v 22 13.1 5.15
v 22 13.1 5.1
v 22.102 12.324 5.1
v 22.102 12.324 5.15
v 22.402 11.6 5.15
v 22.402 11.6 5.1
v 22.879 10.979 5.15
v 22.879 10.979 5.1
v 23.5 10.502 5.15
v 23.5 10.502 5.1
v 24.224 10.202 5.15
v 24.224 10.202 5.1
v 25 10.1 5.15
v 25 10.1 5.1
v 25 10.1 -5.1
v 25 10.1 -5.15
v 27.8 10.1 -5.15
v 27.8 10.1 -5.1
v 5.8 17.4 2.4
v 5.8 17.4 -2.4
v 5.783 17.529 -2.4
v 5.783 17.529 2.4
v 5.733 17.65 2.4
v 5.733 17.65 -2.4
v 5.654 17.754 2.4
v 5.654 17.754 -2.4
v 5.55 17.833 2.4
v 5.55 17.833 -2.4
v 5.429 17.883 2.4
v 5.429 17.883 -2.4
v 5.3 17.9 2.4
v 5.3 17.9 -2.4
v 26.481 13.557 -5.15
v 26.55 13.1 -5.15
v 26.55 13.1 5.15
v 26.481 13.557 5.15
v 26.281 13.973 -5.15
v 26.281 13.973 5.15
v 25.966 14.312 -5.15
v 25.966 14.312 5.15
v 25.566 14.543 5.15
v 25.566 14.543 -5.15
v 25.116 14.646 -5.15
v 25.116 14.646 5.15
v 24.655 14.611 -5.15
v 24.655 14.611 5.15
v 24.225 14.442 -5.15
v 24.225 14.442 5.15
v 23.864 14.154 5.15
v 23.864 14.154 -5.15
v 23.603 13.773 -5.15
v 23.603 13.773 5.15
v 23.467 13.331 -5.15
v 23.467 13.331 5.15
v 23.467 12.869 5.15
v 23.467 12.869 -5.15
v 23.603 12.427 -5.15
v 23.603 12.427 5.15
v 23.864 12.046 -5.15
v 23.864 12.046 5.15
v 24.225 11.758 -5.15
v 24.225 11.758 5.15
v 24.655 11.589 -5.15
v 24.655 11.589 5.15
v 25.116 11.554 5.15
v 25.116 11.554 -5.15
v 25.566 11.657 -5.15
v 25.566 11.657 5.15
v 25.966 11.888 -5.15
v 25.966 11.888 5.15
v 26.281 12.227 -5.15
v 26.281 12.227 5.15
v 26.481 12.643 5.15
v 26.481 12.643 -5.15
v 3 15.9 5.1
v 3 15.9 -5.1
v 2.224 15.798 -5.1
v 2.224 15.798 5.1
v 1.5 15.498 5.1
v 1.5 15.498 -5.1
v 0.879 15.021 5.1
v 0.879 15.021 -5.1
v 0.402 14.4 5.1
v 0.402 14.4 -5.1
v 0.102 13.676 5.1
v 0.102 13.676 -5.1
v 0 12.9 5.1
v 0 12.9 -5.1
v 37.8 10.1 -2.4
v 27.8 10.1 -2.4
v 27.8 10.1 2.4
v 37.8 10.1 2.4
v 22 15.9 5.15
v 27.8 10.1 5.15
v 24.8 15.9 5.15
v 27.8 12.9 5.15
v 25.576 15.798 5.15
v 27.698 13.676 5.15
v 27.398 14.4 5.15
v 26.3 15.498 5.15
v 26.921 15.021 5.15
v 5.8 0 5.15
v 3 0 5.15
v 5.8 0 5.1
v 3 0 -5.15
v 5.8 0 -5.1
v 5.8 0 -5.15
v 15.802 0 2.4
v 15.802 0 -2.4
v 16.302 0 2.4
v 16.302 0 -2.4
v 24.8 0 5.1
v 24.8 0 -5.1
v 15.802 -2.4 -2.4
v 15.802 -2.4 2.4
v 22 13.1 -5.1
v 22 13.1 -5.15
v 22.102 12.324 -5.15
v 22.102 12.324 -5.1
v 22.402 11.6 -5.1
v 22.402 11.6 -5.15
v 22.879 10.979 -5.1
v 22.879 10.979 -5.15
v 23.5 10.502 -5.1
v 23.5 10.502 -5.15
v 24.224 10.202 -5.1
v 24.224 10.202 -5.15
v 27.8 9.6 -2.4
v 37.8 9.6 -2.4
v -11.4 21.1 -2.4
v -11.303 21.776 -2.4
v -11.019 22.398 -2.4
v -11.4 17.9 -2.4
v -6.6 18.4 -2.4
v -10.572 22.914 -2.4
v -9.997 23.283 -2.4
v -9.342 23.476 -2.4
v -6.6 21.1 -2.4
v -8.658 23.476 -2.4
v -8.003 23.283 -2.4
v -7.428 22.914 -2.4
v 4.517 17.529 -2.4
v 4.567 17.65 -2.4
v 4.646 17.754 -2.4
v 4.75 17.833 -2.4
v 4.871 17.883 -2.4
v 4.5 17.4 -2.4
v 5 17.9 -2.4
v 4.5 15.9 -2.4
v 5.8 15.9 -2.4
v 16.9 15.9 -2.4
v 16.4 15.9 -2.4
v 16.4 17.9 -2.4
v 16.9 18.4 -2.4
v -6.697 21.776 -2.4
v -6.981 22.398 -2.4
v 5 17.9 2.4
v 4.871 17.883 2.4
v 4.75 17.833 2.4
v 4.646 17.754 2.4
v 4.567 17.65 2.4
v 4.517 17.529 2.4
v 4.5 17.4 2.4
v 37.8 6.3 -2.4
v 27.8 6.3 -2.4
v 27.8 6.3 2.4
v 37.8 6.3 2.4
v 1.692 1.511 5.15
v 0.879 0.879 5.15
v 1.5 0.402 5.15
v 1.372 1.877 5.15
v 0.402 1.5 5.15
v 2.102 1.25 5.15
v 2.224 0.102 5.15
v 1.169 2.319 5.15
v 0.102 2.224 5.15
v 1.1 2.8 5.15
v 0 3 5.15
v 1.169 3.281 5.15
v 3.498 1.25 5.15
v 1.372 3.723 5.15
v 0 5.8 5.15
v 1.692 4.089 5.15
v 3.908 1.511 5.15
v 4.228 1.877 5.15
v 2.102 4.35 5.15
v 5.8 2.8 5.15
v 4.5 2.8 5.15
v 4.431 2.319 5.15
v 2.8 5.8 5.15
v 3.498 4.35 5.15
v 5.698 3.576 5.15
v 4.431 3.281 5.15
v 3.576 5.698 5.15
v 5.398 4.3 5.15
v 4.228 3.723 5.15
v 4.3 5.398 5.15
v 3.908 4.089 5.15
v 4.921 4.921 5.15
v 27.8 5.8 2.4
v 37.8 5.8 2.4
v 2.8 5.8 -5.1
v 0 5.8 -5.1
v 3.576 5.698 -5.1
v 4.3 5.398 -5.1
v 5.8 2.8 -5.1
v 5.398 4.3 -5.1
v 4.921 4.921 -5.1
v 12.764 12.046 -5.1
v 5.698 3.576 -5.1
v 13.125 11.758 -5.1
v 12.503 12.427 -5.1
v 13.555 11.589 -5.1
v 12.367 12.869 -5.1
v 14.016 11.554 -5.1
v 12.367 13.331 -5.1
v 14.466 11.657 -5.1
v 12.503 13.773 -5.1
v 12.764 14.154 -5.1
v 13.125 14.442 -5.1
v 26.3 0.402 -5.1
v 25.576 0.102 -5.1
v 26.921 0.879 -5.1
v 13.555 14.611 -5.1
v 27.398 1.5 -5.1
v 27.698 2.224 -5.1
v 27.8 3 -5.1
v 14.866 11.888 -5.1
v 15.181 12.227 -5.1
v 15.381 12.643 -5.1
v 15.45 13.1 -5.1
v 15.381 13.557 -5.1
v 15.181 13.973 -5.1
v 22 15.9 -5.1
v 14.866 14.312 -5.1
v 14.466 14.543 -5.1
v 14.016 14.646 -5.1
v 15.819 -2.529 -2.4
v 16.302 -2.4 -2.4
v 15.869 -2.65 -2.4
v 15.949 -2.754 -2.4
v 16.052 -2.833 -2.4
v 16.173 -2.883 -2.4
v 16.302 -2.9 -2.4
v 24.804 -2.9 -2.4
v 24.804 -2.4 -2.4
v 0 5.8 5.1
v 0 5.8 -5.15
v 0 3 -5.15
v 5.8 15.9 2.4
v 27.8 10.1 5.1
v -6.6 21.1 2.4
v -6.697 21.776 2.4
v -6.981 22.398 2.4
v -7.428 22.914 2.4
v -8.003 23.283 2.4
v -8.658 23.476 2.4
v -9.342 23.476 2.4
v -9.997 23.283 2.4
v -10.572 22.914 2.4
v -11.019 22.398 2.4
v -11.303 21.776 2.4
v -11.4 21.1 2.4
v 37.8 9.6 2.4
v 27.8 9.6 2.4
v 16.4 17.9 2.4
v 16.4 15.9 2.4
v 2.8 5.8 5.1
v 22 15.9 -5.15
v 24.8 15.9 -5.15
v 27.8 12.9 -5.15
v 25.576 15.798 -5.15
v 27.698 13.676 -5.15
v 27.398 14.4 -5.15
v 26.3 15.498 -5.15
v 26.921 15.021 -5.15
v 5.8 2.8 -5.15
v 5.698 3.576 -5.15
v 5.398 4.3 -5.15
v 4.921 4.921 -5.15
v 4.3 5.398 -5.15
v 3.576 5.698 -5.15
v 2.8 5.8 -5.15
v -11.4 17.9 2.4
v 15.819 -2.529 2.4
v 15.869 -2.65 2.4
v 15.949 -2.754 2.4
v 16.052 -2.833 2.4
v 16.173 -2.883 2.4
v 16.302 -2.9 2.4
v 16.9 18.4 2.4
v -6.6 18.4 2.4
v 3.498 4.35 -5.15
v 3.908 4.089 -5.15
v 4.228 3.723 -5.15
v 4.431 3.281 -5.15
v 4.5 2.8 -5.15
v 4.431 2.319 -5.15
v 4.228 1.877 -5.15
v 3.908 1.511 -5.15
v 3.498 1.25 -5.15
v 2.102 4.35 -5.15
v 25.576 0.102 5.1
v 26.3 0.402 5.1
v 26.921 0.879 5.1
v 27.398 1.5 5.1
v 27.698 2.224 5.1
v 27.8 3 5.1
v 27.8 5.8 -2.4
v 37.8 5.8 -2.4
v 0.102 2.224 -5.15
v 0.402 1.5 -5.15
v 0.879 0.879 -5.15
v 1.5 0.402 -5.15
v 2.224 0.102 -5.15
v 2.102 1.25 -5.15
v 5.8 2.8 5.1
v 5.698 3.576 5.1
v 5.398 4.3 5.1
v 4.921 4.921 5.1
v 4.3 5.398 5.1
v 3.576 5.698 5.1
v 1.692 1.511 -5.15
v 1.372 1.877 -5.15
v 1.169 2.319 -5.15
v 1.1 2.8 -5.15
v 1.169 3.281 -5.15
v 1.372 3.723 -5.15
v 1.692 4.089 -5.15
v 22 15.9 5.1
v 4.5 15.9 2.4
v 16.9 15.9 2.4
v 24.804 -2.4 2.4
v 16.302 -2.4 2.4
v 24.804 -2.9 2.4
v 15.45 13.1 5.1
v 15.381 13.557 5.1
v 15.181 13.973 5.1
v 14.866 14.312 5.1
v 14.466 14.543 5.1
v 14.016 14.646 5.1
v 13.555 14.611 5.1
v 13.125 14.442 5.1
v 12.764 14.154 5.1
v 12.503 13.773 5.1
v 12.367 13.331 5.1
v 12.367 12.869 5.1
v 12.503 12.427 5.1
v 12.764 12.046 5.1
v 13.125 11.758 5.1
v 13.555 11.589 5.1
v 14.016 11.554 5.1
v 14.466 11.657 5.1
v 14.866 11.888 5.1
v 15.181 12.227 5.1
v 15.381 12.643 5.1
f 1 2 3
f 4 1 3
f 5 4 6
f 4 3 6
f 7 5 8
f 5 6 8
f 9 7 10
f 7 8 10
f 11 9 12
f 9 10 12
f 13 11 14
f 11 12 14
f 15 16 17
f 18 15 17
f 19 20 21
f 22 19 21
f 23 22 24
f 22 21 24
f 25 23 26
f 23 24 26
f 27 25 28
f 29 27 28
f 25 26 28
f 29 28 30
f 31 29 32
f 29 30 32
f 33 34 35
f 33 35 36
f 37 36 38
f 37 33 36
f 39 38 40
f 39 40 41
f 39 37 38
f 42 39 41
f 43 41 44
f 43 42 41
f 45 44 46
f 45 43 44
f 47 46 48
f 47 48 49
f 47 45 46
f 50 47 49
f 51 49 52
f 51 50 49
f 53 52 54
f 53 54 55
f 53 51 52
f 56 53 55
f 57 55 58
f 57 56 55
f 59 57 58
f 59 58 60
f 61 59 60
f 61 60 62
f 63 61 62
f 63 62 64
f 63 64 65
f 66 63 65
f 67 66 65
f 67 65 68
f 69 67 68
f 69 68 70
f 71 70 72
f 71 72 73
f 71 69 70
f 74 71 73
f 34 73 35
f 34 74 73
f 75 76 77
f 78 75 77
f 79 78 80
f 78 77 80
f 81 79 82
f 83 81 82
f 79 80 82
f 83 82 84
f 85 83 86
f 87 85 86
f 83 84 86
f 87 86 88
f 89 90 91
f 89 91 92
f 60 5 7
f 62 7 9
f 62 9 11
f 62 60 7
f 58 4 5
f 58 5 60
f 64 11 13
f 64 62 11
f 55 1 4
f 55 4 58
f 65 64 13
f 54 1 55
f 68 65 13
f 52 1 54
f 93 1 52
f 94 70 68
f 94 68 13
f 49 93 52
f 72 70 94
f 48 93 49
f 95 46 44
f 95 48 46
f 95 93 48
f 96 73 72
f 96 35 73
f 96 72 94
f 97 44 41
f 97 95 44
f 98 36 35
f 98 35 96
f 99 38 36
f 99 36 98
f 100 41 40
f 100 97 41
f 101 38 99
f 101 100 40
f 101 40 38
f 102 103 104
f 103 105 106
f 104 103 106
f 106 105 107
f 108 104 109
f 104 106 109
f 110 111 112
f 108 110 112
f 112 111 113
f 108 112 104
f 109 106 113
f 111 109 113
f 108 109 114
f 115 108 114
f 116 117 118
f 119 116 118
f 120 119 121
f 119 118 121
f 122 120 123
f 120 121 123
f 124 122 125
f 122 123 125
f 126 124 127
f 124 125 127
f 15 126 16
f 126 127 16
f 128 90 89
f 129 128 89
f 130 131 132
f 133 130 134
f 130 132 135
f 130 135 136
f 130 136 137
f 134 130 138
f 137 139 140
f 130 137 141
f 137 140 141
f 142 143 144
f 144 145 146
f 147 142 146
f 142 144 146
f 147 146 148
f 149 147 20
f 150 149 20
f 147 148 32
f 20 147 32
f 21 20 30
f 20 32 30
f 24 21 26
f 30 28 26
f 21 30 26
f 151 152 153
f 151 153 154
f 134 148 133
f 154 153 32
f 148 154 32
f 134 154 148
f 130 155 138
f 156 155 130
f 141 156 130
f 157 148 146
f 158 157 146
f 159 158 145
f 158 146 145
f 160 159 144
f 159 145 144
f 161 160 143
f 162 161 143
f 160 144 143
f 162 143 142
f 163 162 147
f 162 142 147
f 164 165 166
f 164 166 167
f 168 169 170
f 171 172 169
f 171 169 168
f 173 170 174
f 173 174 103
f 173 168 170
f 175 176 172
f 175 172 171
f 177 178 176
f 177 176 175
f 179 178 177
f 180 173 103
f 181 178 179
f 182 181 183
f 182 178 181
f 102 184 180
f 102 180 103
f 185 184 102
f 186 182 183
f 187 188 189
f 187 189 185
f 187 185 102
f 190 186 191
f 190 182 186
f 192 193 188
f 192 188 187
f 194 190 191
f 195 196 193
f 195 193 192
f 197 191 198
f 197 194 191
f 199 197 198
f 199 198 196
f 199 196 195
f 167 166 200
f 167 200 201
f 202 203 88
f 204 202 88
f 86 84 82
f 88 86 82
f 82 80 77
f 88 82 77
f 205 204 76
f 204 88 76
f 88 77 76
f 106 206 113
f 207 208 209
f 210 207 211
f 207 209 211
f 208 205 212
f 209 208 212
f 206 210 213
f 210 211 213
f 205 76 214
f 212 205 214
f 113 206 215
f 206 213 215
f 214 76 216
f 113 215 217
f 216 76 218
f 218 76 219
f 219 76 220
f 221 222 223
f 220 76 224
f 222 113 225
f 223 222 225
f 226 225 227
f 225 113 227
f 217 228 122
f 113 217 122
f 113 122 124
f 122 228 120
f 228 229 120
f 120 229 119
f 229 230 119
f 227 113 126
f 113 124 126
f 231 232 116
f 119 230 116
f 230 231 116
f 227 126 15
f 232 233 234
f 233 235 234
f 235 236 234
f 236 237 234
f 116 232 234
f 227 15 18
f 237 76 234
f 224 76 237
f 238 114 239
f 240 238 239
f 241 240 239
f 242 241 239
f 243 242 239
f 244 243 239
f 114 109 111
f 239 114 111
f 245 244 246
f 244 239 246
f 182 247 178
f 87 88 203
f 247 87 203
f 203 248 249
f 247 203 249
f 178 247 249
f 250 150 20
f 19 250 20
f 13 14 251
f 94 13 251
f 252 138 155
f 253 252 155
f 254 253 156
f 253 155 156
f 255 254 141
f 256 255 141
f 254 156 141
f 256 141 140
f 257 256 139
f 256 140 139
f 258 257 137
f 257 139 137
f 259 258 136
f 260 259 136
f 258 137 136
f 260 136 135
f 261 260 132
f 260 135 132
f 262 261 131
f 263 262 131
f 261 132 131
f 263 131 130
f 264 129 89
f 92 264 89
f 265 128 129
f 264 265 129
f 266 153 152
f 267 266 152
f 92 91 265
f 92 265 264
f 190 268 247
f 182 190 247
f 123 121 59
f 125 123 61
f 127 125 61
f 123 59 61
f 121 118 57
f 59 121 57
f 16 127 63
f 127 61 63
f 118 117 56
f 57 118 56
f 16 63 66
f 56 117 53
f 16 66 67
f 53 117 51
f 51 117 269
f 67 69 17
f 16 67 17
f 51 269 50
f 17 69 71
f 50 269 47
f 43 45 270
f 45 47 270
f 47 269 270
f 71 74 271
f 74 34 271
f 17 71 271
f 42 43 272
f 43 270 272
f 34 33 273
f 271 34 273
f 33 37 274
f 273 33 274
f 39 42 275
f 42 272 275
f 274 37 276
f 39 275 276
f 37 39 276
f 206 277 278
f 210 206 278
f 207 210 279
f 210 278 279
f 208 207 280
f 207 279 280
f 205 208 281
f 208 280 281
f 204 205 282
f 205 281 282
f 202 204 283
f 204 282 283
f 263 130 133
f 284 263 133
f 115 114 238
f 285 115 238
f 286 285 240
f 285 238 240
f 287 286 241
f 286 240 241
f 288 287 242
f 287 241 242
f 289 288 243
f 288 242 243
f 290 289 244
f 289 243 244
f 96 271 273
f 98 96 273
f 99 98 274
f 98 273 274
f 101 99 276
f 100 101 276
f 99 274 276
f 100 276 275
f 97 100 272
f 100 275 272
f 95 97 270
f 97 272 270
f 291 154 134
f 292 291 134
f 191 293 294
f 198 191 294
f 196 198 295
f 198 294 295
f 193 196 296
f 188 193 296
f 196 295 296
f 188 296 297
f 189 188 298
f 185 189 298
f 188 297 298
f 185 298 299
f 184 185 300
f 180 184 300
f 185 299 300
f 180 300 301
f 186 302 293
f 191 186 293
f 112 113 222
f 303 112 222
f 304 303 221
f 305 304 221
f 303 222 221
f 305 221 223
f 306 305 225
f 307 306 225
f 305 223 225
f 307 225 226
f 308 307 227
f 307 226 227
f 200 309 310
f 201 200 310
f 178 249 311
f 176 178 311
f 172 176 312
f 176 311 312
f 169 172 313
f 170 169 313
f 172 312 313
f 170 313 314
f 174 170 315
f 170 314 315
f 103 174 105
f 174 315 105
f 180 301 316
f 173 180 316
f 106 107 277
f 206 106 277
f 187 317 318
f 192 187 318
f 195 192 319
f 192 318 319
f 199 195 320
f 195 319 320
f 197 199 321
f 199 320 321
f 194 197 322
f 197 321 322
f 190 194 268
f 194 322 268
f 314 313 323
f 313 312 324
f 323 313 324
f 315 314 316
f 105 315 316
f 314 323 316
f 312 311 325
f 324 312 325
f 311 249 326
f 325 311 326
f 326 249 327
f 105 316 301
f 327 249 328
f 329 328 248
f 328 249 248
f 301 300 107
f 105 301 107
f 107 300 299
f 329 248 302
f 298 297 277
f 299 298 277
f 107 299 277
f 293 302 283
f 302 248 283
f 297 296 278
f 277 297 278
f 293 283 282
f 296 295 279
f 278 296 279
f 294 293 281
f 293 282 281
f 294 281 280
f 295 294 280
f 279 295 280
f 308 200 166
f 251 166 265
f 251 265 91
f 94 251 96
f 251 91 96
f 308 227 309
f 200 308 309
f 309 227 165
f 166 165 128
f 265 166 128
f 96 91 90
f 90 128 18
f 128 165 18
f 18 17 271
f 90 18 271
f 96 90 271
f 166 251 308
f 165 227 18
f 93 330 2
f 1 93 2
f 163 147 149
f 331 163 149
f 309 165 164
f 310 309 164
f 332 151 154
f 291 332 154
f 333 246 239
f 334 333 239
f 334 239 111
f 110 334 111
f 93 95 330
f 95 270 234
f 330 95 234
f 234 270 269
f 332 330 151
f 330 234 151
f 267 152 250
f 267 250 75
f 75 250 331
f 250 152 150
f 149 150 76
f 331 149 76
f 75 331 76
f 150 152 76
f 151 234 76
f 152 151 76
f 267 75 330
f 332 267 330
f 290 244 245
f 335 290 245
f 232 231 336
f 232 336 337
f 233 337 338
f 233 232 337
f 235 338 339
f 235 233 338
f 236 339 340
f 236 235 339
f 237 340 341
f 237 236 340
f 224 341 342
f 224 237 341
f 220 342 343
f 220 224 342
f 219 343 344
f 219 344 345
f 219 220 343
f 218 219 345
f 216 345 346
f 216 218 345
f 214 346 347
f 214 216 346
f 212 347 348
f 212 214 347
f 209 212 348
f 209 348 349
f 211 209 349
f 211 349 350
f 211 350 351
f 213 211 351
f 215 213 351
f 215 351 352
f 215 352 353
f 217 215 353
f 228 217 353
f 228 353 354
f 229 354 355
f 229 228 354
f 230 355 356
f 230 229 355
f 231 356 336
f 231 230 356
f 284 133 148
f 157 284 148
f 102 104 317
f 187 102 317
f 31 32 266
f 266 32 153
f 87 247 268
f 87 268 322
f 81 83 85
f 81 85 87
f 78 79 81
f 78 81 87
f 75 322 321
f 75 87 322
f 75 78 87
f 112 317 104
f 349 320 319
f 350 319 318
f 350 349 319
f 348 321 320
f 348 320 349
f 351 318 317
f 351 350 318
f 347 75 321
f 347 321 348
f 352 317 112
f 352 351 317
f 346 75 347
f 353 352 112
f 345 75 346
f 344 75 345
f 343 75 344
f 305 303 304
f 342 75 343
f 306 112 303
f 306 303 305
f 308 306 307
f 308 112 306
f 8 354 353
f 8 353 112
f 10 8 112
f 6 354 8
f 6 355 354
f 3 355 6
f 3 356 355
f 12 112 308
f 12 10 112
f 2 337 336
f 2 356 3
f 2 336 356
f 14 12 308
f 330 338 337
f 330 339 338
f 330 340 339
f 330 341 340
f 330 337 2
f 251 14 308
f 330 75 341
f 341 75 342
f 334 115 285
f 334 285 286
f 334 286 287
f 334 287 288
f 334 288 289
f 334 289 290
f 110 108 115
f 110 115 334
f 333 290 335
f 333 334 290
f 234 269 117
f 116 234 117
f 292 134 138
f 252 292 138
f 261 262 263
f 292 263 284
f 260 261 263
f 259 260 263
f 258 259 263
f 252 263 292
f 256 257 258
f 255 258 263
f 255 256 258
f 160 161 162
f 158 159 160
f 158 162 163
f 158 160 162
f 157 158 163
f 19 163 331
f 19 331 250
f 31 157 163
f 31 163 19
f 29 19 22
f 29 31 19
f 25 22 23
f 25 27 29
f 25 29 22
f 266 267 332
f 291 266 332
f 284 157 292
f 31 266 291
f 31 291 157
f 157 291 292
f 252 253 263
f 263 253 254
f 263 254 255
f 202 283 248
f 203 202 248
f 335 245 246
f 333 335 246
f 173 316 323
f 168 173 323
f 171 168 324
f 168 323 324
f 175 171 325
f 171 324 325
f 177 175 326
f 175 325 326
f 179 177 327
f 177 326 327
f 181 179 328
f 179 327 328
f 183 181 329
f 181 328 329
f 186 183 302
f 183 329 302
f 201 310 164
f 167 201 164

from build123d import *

# Parameters (mm, degrees)
BOSS_EXTRUDE1_DEPTH      = 5.1
BOSS_EXTRUDE1_DEPTH_BACK = 5.1
SKETCH1_R                = 1.55
BOSS_EXTRUDE2_DEPTH      = 5.15
BOSS_EXTRUDE2_DEPTH_BACK = 5.15
SKETCH1_3_R              = 1.55
BOSS_EXTRUDE3_DEPTH      = 2.4
BOSS_EXTRUDE3_DEPTH_BACK = 2.4
SKETCH1_4_W              = 10
SKETCH1_4_H              = 0.5


with BuildPart() as part:
    # Sketch1 → Boss-Extrude1 (new, two sides: drawn at the far end of the back side and taken through both)
    with BuildSketch(Plane.XY.offset(-BOSS_EXTRUDE1_DEPTH_BACK)):
        with BuildLine():
            Line((5.8, 2.8), (5.8, 0))
            Line((5.8, 0), (15.802181202, 0))
            Line((15.802181202, 0), (16.302181202, 0))
            Line((16.302181202, 0), (24.8, 0))
            ThreePointArc((24.8, 0), (26.921320344, 0.878679656), (27.8, 3))
            Line((27.8, 3), (27.8, 5.8))
            Line((27.8, 5.8), (27.8, 6.3))
            Line((27.8, 6.3), (27.8, 9.6))
            Line((27.8, 9.6), (27.8, 10.1))
            Line((27.8, 10.1), (25, 10.1))
            ThreePointArc((25, 10.1), (22.878679656, 10.978679656), (22, 13.1))
            Line((22, 13.1), (22, 15.9))
            Line((22, 15.9), (16.9, 15.9))
            Line((16.9, 15.9), (16.4, 15.9))
            Line((16.4, 15.9), (5.8, 15.9))
            Line((5.8, 15.9), (4.5, 15.9))
            Line((4.5, 15.9), (3, 15.9))
            ThreePointArc((3, 15.9), (0.878679656, 15.021320344), (0, 12.9))
            Line((0, 12.9), (0, 5.8))
            Line((0, 5.8), (2.8, 5.8))
            ThreePointArc((2.8, 5.8), (4.921320344, 4.921320344), (5.8, 2.8))
        make_face()
        with Locations((13.9, 13.1)):
            Circle(SKETCH1_R, mode=Mode.SUBTRACT)
    extrude(amount=BOSS_EXTRUDE1_DEPTH + BOSS_EXTRUDE1_DEPTH_BACK)

    # Sketch1<3> → Boss-Extrude2 (add, two sides: drawn at the far end of the back side and taken through both)
    # profile 1 of 2: a face of its own
    with BuildSketch(Plane.XY.offset(-BOSS_EXTRUDE2_DEPTH_BACK)):
        with BuildLine():
            ThreePointArc((0, 3), (0.878679656, 0.878679656), (3, 0))
            Line((3, 0), (5.8, 0))
            Line((5.8, 0), (5.8, 2.8))
            ThreePointArc((5.8, 2.8), (4.921320344, 4.921320344), (2.8, 5.8))
            Line((2.8, 5.8), (0, 5.8))
            Line((0, 5.8), (0, 3))
        make_face()
        with BuildLine():
            Line((3.498212002, 1.25), (2.101787998, 1.25))
            ThreePointArc((2.101787998, 1.25), (1.1, 2.8), (2.101787998, 4.35))
            Line((2.101787998, 4.35), (3.498212002, 4.35))
            ThreePointArc((3.498212002, 4.35), (4.5, 2.8), (3.498212002, 1.25))
        make_face(mode=Mode.SUBTRACT)
    # profile 2 of 2: a face of its own
    with BuildSketch(Plane.XY.offset(-BOSS_EXTRUDE2_DEPTH_BACK)):
        with BuildLine():
            Line((25, 10.1), (27.8, 10.1))
            Line((27.8, 10.1), (27.8, 12.9))
            ThreePointArc((27.8, 12.9), (26.921320344, 15.021320344), (24.8, 15.9))
            Line((24.8, 15.9), (22, 15.9))
            Line((22, 15.9), (22, 13.1))
            ThreePointArc((22, 13.1), (22.878679656, 10.978679656), (25, 10.1))
        make_face()
        with Locations((25, 13.1)):
            Circle(SKETCH1_3_R, mode=Mode.SUBTRACT)
    extrude(amount=BOSS_EXTRUDE2_DEPTH + BOSS_EXTRUDE2_DEPTH_BACK)

    # Sketch1<4> → Boss-Extrude3 (add, two sides: drawn at the far end of the back side and taken through both)
    with BuildSketch(Plane.XY.offset(-BOSS_EXTRUDE3_DEPTH_BACK)):
        with BuildLine():
            Line((16.302181202, 0), (15.802181202, 0))
            Line((15.802181202, 0), (15.802181202, -2.4))
            ThreePointArc((15.802181202, -2.4), (15.948627812, -2.753553391), (16.302181202, -2.9))
            Line((16.302181202, -2.9), (24.80383619, -2.9))
            Line((24.80383619, -2.9), (24.80383619, -2.4))
            Line((24.80383619, -2.4), (16.302181202, -2.4))
            Line((16.302181202, -2.4), (16.302181202, 0))
        make_face()
        with BuildLine():
            Line((4.5, 17.4), (4.5, 15.9))
            Line((4.5, 15.9), (5.8, 15.9))
            Line((5.8, 15.9), (5.8, 17.4))
            ThreePointArc((5.8, 17.4), (5.653553391, 17.753553391), (5.3, 17.9))
            Line((5.3, 17.9), (16.4, 17.9))
            Line((16.4, 17.9), (16.4, 15.9))
            Line((16.4, 15.9), (16.9, 15.9))
            Line((16.9, 15.9), (16.9, 18.4))
            Line((16.9, 18.4), (-6.6, 18.4))
            Line((-6.6, 18.4), (-6.6, 21.1))
            ThreePointArc((-6.6, 21.1), (-9, 23.5), (-11.4, 21.1))
            Line((-11.4, 21.1), (-11.4, 17.9))
            Line((-11.4, 17.9), (5, 17.9))
            ThreePointArc((5, 17.9), (4.646446609, 17.753553391), (4.5, 17.4))
        make_face()
        with Locations((32.8, 6.05)):
            Rectangle(SKETCH1_4_W, SKETCH1_4_H)
        with Locations((32.8, 9.85)):
            Rectangle(SKETCH1_4_W, SKETCH1_4_H)
    extrude(amount=BOSS_EXTRUDE3_DEPTH + BOSS_EXTRUDE3_DEPTH_BACK)


solid = part.part
